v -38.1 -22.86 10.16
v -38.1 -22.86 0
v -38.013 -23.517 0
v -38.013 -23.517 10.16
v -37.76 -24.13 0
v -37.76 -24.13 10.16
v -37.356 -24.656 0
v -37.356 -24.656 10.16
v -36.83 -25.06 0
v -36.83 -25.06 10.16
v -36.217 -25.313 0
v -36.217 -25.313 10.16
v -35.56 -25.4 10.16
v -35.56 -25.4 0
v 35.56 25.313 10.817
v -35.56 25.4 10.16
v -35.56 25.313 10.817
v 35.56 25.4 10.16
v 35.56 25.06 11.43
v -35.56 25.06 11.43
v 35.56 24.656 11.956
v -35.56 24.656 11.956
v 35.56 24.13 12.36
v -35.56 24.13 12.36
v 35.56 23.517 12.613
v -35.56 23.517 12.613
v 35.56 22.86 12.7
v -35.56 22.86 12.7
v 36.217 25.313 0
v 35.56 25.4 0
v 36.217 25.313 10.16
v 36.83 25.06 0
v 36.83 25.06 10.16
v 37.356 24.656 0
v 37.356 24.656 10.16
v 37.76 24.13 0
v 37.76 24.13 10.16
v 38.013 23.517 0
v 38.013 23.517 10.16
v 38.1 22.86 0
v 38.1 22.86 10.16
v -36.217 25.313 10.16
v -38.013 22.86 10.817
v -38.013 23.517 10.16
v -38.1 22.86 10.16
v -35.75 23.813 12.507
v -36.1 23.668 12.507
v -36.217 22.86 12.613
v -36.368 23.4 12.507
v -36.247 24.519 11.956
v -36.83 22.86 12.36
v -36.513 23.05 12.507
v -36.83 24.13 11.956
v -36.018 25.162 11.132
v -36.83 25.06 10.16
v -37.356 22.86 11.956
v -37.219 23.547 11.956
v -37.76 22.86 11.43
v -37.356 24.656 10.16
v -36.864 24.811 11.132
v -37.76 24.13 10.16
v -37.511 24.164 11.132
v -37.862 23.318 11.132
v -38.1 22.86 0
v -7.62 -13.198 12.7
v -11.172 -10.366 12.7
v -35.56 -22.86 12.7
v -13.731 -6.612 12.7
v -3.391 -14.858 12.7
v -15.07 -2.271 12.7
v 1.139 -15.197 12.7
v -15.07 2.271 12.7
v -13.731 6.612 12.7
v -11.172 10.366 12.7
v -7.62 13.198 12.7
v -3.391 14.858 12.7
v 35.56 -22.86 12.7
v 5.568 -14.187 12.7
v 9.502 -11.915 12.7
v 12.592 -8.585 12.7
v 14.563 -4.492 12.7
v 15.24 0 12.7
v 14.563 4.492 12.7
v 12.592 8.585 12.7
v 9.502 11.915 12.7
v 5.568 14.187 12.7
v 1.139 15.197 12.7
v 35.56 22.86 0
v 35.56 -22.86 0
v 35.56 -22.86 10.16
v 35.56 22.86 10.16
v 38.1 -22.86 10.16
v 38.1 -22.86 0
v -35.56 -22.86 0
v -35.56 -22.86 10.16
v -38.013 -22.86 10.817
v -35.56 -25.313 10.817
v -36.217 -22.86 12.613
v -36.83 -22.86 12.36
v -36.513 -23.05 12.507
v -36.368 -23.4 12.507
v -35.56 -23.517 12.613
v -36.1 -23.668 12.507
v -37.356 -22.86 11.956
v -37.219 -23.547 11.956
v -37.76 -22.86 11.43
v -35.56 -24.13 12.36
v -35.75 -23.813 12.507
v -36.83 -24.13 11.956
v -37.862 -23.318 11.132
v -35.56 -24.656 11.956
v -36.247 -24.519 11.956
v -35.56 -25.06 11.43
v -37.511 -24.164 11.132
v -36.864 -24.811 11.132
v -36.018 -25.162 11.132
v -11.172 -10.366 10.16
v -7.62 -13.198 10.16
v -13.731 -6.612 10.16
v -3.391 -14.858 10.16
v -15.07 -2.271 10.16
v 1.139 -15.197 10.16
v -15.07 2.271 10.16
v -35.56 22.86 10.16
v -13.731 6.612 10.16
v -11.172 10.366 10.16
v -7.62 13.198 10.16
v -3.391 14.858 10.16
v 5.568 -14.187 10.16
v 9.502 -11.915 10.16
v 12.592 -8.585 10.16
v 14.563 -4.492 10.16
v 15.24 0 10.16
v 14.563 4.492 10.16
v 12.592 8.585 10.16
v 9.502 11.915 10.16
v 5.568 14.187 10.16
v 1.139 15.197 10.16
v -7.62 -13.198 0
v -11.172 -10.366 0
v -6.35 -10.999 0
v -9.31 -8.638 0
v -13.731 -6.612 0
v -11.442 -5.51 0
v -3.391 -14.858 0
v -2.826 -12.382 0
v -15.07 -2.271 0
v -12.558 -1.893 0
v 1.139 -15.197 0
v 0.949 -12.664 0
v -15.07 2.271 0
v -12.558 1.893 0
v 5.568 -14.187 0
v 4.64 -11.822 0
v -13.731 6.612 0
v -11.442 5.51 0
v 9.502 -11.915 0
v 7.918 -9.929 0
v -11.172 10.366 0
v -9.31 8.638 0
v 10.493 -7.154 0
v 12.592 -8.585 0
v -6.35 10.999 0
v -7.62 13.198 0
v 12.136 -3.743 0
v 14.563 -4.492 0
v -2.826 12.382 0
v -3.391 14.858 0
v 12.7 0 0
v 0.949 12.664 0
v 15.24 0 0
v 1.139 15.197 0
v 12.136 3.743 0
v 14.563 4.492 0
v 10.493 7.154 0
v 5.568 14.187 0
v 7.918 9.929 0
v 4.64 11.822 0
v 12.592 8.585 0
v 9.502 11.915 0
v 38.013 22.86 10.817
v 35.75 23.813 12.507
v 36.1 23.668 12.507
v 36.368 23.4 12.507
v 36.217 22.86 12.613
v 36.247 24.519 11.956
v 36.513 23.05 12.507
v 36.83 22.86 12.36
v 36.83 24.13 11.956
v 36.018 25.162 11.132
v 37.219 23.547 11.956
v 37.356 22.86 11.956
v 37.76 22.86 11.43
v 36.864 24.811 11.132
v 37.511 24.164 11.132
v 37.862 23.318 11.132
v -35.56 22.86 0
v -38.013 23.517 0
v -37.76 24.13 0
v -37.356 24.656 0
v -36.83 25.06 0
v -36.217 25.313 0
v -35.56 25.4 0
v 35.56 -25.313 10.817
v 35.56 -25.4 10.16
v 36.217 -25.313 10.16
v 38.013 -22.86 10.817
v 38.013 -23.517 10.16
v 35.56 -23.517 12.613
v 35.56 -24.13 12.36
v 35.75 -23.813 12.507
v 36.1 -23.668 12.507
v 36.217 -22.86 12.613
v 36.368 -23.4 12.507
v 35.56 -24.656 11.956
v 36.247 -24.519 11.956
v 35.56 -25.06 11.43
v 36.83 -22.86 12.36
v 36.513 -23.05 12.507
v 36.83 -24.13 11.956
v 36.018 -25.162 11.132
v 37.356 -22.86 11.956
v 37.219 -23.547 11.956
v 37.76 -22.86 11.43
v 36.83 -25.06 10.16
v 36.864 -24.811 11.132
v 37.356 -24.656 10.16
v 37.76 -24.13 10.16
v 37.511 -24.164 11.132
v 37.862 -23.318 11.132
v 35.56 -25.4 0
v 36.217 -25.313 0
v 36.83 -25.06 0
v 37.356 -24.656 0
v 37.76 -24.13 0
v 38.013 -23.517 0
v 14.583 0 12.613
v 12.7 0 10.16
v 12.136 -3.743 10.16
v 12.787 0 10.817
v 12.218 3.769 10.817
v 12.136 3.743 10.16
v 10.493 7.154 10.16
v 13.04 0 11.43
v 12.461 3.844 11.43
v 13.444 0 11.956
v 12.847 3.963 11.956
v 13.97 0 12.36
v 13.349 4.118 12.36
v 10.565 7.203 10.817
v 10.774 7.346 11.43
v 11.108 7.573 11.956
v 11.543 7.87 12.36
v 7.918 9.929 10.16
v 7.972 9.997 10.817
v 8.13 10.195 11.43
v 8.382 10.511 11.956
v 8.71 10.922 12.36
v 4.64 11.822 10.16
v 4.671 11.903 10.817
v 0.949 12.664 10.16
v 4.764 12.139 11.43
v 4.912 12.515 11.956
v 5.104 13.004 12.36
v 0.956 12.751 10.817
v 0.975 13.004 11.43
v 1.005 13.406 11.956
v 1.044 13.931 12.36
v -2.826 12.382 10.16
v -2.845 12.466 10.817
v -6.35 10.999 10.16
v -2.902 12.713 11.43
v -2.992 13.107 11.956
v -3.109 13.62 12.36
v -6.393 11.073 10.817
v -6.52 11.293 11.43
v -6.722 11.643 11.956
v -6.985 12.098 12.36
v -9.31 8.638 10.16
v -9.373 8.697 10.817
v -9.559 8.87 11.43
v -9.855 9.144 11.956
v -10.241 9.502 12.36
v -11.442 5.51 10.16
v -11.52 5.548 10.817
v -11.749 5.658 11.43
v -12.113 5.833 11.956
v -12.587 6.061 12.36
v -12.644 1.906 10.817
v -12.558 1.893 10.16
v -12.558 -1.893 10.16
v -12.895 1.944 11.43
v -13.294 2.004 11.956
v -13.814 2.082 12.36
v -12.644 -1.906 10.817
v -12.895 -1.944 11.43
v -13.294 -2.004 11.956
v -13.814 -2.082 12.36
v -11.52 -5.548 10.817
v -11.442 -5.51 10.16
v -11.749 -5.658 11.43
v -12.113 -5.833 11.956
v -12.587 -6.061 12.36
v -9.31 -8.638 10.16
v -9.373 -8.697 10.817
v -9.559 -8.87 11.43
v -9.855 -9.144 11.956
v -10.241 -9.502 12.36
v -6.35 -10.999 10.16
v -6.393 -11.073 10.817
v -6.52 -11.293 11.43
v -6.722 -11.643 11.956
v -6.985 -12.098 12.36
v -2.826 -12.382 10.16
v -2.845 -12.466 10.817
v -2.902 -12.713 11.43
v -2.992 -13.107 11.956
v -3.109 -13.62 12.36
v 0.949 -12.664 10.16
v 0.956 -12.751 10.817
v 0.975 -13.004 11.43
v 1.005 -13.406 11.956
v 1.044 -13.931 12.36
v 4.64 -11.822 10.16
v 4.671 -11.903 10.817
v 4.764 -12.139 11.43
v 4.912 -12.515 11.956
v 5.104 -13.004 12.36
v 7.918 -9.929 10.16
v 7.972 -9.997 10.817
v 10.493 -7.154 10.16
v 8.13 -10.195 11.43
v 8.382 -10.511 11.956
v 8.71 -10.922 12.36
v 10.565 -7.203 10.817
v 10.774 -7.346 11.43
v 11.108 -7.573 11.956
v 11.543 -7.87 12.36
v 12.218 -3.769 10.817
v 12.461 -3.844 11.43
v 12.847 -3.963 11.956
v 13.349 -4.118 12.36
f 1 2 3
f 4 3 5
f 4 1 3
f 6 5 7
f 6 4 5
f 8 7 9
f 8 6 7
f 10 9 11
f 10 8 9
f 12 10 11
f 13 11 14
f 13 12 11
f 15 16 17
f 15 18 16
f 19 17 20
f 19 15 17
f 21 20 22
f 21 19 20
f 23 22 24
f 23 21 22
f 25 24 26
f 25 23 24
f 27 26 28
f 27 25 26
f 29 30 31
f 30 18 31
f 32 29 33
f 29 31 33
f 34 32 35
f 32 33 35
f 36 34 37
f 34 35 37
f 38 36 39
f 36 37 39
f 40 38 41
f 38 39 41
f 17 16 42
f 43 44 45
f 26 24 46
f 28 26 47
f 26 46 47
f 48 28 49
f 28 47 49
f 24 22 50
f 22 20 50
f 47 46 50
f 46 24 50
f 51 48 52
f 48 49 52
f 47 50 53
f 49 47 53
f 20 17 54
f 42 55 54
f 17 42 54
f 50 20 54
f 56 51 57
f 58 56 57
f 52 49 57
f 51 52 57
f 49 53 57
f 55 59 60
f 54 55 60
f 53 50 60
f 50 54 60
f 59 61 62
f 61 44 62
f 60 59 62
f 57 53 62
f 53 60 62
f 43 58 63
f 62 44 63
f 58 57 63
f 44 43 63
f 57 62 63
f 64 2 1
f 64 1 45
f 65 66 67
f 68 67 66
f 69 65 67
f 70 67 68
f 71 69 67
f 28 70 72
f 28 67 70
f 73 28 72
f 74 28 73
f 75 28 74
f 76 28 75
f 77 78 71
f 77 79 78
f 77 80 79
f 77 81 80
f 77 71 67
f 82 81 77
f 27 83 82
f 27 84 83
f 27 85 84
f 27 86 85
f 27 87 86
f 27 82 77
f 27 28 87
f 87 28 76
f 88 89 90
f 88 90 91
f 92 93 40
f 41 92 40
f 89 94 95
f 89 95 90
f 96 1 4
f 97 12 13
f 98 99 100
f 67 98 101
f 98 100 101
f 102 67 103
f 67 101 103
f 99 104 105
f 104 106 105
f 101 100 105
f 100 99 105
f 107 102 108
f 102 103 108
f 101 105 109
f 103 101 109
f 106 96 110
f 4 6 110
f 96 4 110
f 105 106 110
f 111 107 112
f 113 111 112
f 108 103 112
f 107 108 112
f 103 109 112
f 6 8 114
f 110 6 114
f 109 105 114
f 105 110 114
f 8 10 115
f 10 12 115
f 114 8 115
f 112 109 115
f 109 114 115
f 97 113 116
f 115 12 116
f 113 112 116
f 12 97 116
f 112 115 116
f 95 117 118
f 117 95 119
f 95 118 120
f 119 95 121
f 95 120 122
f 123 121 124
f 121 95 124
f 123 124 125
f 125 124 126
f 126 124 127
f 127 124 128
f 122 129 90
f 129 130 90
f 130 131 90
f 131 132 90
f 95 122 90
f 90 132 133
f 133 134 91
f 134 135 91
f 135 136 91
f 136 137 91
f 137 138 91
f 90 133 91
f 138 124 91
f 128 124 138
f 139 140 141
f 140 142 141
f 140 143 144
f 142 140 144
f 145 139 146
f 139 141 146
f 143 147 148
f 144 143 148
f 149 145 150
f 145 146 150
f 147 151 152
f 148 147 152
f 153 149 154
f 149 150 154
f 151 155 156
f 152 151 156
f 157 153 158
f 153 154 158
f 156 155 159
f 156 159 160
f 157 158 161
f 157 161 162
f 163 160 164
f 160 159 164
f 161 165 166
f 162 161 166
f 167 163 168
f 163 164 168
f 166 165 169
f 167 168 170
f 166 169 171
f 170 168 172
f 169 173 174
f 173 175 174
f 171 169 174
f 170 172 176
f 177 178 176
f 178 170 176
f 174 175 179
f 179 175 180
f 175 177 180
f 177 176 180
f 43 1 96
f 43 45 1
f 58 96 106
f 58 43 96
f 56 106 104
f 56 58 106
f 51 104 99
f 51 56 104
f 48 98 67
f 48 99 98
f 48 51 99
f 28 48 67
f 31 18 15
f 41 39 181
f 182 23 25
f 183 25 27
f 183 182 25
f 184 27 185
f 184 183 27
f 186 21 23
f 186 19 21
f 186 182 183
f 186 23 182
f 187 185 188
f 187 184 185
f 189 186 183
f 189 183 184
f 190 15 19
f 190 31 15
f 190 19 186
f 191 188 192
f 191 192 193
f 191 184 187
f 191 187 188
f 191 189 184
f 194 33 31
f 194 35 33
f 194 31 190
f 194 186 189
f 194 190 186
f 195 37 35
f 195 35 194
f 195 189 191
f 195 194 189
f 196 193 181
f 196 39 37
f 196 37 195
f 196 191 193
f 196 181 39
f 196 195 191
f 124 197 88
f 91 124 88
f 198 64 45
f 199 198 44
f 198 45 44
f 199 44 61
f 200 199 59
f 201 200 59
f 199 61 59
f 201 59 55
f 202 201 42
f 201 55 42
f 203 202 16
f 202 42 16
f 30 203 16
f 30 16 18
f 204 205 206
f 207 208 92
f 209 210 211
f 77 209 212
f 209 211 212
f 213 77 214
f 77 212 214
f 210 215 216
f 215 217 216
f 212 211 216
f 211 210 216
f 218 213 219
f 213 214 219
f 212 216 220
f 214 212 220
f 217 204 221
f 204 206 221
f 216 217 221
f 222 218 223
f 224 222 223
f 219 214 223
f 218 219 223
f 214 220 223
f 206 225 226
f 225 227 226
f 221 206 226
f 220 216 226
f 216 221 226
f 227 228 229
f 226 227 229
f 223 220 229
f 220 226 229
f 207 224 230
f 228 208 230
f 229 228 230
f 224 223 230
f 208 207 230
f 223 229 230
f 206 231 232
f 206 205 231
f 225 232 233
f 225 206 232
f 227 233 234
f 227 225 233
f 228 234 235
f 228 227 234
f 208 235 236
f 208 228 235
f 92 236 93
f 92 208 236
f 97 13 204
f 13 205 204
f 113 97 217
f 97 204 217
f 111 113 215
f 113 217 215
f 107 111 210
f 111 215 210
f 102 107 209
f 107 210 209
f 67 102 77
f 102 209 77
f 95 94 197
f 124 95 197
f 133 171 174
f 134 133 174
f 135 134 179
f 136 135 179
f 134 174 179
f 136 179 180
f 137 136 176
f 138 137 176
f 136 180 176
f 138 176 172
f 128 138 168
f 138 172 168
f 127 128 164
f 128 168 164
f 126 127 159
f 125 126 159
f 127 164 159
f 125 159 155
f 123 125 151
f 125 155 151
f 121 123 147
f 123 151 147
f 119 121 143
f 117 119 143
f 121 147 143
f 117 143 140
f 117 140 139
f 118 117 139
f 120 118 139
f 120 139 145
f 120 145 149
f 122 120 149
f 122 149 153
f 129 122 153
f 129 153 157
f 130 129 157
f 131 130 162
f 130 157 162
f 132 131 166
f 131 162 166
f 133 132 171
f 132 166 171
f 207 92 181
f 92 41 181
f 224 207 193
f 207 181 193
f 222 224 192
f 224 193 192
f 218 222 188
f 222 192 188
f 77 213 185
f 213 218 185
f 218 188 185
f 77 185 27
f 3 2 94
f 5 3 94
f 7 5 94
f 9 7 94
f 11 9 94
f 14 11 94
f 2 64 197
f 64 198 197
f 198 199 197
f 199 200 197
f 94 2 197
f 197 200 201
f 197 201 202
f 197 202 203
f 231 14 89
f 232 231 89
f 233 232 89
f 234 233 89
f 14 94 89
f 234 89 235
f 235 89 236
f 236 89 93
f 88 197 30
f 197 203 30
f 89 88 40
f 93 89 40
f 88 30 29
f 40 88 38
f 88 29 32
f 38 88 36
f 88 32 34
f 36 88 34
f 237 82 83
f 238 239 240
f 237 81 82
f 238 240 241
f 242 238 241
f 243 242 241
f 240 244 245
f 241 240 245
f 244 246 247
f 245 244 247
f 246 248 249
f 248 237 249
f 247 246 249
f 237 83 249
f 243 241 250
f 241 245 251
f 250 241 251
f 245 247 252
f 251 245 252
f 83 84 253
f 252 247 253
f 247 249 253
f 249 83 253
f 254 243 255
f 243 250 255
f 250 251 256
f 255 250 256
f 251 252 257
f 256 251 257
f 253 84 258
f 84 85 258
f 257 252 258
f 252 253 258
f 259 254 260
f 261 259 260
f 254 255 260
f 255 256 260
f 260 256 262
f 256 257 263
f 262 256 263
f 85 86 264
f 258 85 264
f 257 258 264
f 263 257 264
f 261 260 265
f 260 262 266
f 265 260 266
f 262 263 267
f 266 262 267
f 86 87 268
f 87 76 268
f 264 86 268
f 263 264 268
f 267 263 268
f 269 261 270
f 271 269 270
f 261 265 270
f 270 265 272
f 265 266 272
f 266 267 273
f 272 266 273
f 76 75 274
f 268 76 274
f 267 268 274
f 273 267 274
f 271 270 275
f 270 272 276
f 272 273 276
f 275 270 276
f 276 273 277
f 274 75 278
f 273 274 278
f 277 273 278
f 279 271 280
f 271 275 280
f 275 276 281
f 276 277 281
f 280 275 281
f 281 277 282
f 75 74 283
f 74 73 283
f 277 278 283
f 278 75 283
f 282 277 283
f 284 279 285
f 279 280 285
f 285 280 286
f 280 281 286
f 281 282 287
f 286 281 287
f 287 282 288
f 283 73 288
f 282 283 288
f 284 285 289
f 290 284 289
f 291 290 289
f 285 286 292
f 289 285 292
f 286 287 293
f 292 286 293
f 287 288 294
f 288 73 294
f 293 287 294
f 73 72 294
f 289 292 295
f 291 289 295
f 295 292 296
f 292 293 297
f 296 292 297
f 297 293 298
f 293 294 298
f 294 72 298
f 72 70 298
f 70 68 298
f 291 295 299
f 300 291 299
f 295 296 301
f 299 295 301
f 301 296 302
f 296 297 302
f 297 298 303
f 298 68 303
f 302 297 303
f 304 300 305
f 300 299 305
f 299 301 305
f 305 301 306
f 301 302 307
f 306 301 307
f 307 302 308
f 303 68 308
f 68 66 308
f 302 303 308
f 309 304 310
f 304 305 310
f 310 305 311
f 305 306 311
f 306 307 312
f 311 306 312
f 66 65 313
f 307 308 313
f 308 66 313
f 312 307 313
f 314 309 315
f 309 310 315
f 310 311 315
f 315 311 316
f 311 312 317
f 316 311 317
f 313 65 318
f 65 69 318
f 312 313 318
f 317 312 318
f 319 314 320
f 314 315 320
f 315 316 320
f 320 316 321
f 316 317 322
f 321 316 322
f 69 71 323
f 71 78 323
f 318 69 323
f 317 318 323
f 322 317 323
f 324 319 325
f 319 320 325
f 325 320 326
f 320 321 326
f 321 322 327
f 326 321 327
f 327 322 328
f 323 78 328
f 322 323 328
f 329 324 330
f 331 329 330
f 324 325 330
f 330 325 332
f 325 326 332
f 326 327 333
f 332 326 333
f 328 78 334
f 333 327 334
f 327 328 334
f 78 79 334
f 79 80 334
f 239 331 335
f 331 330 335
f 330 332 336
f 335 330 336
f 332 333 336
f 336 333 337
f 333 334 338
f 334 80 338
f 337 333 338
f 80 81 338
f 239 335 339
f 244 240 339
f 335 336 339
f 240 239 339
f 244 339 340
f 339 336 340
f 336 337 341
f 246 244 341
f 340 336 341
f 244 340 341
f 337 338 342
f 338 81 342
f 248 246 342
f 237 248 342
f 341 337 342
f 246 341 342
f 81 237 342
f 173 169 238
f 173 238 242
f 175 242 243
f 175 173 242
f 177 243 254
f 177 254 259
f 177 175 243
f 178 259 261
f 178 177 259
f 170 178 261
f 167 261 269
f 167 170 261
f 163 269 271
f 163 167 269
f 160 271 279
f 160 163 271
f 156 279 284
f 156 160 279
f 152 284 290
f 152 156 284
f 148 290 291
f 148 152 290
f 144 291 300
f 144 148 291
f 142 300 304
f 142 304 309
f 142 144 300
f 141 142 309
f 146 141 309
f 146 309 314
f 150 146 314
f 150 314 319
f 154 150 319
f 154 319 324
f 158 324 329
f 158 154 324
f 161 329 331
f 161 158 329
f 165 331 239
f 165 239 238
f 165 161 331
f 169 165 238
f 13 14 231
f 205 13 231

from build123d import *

# Parameters (mm, degrees)
F0_W     = 76.2
F0_H     = 50.8
F0_R     = 12.7
F1_DEPTH = 12.7
F2_R     = 2.54
F3_T     = 2.54


# Not quite as in the source:
# - a shell that OpenCascade refuses in one call is made with other operations: the cavity is built on its own and cut out


with BuildPart() as f1:
    # F0 (on Top) → F1 (new body)
    with BuildSketch(Plane.XY):
        Rectangle(F0_W, F0_H)
        Circle(F0_R, mode=Mode.SUBTRACT)
    extrude(amount=F1_DEPTH)

    # F2
    f2_edges = [f1.edges().sort_by_distance(p)[0] for p in [
        (-38.1, -25.4, 6.35),
        (38.1, -25.4, 6.35),
        (38.1, 25.4, 6.35),
        (-38.1, 25.4, 6.35),
        (0, 25.4, 12.7),
        (-38.1, 0, 12.7),
        (0, -25.4, 12.7),
        (38.1, 0, 12.7),
        (-12.7, 0, 12.7),
    ]]
    fillet(f2_edges, radius=F2_R)

    # F3: shell of thickness 2.54, made by hand


with BuildPart() as f3_core1:
    # F3_t2: copy of F1
    add(f1.part)

    # the walls: a layer under each face that stays
    f3_faces = [f3_core1.faces().sort_by_distance(p)[0] for p in [
        (38.1, 0, 5.08),
        (0, -25.4, 5.08),
        (0, 25.4, 5.08),
        (-38.1, 0, 5.08),
        (-12.7, 0, 5.08),
        (-23.7066666667, -15.24, 12.7),
    ]]
    thicken(f3_faces, amount=-F3_T, mode=Mode.SUBTRACT)


with BuildPart() as f1_1:
    add(f1.part)

    # what is left inside the walls is the cavity
    f3_cavity = [f3_core1.part.solids().sort_by_distance(p)[0] for p in [
        (-17.78, 7.62, 0.0254),
    ]]
    add(f3_cavity, mode=Mode.SUBTRACT)


solid = f1_1.part
